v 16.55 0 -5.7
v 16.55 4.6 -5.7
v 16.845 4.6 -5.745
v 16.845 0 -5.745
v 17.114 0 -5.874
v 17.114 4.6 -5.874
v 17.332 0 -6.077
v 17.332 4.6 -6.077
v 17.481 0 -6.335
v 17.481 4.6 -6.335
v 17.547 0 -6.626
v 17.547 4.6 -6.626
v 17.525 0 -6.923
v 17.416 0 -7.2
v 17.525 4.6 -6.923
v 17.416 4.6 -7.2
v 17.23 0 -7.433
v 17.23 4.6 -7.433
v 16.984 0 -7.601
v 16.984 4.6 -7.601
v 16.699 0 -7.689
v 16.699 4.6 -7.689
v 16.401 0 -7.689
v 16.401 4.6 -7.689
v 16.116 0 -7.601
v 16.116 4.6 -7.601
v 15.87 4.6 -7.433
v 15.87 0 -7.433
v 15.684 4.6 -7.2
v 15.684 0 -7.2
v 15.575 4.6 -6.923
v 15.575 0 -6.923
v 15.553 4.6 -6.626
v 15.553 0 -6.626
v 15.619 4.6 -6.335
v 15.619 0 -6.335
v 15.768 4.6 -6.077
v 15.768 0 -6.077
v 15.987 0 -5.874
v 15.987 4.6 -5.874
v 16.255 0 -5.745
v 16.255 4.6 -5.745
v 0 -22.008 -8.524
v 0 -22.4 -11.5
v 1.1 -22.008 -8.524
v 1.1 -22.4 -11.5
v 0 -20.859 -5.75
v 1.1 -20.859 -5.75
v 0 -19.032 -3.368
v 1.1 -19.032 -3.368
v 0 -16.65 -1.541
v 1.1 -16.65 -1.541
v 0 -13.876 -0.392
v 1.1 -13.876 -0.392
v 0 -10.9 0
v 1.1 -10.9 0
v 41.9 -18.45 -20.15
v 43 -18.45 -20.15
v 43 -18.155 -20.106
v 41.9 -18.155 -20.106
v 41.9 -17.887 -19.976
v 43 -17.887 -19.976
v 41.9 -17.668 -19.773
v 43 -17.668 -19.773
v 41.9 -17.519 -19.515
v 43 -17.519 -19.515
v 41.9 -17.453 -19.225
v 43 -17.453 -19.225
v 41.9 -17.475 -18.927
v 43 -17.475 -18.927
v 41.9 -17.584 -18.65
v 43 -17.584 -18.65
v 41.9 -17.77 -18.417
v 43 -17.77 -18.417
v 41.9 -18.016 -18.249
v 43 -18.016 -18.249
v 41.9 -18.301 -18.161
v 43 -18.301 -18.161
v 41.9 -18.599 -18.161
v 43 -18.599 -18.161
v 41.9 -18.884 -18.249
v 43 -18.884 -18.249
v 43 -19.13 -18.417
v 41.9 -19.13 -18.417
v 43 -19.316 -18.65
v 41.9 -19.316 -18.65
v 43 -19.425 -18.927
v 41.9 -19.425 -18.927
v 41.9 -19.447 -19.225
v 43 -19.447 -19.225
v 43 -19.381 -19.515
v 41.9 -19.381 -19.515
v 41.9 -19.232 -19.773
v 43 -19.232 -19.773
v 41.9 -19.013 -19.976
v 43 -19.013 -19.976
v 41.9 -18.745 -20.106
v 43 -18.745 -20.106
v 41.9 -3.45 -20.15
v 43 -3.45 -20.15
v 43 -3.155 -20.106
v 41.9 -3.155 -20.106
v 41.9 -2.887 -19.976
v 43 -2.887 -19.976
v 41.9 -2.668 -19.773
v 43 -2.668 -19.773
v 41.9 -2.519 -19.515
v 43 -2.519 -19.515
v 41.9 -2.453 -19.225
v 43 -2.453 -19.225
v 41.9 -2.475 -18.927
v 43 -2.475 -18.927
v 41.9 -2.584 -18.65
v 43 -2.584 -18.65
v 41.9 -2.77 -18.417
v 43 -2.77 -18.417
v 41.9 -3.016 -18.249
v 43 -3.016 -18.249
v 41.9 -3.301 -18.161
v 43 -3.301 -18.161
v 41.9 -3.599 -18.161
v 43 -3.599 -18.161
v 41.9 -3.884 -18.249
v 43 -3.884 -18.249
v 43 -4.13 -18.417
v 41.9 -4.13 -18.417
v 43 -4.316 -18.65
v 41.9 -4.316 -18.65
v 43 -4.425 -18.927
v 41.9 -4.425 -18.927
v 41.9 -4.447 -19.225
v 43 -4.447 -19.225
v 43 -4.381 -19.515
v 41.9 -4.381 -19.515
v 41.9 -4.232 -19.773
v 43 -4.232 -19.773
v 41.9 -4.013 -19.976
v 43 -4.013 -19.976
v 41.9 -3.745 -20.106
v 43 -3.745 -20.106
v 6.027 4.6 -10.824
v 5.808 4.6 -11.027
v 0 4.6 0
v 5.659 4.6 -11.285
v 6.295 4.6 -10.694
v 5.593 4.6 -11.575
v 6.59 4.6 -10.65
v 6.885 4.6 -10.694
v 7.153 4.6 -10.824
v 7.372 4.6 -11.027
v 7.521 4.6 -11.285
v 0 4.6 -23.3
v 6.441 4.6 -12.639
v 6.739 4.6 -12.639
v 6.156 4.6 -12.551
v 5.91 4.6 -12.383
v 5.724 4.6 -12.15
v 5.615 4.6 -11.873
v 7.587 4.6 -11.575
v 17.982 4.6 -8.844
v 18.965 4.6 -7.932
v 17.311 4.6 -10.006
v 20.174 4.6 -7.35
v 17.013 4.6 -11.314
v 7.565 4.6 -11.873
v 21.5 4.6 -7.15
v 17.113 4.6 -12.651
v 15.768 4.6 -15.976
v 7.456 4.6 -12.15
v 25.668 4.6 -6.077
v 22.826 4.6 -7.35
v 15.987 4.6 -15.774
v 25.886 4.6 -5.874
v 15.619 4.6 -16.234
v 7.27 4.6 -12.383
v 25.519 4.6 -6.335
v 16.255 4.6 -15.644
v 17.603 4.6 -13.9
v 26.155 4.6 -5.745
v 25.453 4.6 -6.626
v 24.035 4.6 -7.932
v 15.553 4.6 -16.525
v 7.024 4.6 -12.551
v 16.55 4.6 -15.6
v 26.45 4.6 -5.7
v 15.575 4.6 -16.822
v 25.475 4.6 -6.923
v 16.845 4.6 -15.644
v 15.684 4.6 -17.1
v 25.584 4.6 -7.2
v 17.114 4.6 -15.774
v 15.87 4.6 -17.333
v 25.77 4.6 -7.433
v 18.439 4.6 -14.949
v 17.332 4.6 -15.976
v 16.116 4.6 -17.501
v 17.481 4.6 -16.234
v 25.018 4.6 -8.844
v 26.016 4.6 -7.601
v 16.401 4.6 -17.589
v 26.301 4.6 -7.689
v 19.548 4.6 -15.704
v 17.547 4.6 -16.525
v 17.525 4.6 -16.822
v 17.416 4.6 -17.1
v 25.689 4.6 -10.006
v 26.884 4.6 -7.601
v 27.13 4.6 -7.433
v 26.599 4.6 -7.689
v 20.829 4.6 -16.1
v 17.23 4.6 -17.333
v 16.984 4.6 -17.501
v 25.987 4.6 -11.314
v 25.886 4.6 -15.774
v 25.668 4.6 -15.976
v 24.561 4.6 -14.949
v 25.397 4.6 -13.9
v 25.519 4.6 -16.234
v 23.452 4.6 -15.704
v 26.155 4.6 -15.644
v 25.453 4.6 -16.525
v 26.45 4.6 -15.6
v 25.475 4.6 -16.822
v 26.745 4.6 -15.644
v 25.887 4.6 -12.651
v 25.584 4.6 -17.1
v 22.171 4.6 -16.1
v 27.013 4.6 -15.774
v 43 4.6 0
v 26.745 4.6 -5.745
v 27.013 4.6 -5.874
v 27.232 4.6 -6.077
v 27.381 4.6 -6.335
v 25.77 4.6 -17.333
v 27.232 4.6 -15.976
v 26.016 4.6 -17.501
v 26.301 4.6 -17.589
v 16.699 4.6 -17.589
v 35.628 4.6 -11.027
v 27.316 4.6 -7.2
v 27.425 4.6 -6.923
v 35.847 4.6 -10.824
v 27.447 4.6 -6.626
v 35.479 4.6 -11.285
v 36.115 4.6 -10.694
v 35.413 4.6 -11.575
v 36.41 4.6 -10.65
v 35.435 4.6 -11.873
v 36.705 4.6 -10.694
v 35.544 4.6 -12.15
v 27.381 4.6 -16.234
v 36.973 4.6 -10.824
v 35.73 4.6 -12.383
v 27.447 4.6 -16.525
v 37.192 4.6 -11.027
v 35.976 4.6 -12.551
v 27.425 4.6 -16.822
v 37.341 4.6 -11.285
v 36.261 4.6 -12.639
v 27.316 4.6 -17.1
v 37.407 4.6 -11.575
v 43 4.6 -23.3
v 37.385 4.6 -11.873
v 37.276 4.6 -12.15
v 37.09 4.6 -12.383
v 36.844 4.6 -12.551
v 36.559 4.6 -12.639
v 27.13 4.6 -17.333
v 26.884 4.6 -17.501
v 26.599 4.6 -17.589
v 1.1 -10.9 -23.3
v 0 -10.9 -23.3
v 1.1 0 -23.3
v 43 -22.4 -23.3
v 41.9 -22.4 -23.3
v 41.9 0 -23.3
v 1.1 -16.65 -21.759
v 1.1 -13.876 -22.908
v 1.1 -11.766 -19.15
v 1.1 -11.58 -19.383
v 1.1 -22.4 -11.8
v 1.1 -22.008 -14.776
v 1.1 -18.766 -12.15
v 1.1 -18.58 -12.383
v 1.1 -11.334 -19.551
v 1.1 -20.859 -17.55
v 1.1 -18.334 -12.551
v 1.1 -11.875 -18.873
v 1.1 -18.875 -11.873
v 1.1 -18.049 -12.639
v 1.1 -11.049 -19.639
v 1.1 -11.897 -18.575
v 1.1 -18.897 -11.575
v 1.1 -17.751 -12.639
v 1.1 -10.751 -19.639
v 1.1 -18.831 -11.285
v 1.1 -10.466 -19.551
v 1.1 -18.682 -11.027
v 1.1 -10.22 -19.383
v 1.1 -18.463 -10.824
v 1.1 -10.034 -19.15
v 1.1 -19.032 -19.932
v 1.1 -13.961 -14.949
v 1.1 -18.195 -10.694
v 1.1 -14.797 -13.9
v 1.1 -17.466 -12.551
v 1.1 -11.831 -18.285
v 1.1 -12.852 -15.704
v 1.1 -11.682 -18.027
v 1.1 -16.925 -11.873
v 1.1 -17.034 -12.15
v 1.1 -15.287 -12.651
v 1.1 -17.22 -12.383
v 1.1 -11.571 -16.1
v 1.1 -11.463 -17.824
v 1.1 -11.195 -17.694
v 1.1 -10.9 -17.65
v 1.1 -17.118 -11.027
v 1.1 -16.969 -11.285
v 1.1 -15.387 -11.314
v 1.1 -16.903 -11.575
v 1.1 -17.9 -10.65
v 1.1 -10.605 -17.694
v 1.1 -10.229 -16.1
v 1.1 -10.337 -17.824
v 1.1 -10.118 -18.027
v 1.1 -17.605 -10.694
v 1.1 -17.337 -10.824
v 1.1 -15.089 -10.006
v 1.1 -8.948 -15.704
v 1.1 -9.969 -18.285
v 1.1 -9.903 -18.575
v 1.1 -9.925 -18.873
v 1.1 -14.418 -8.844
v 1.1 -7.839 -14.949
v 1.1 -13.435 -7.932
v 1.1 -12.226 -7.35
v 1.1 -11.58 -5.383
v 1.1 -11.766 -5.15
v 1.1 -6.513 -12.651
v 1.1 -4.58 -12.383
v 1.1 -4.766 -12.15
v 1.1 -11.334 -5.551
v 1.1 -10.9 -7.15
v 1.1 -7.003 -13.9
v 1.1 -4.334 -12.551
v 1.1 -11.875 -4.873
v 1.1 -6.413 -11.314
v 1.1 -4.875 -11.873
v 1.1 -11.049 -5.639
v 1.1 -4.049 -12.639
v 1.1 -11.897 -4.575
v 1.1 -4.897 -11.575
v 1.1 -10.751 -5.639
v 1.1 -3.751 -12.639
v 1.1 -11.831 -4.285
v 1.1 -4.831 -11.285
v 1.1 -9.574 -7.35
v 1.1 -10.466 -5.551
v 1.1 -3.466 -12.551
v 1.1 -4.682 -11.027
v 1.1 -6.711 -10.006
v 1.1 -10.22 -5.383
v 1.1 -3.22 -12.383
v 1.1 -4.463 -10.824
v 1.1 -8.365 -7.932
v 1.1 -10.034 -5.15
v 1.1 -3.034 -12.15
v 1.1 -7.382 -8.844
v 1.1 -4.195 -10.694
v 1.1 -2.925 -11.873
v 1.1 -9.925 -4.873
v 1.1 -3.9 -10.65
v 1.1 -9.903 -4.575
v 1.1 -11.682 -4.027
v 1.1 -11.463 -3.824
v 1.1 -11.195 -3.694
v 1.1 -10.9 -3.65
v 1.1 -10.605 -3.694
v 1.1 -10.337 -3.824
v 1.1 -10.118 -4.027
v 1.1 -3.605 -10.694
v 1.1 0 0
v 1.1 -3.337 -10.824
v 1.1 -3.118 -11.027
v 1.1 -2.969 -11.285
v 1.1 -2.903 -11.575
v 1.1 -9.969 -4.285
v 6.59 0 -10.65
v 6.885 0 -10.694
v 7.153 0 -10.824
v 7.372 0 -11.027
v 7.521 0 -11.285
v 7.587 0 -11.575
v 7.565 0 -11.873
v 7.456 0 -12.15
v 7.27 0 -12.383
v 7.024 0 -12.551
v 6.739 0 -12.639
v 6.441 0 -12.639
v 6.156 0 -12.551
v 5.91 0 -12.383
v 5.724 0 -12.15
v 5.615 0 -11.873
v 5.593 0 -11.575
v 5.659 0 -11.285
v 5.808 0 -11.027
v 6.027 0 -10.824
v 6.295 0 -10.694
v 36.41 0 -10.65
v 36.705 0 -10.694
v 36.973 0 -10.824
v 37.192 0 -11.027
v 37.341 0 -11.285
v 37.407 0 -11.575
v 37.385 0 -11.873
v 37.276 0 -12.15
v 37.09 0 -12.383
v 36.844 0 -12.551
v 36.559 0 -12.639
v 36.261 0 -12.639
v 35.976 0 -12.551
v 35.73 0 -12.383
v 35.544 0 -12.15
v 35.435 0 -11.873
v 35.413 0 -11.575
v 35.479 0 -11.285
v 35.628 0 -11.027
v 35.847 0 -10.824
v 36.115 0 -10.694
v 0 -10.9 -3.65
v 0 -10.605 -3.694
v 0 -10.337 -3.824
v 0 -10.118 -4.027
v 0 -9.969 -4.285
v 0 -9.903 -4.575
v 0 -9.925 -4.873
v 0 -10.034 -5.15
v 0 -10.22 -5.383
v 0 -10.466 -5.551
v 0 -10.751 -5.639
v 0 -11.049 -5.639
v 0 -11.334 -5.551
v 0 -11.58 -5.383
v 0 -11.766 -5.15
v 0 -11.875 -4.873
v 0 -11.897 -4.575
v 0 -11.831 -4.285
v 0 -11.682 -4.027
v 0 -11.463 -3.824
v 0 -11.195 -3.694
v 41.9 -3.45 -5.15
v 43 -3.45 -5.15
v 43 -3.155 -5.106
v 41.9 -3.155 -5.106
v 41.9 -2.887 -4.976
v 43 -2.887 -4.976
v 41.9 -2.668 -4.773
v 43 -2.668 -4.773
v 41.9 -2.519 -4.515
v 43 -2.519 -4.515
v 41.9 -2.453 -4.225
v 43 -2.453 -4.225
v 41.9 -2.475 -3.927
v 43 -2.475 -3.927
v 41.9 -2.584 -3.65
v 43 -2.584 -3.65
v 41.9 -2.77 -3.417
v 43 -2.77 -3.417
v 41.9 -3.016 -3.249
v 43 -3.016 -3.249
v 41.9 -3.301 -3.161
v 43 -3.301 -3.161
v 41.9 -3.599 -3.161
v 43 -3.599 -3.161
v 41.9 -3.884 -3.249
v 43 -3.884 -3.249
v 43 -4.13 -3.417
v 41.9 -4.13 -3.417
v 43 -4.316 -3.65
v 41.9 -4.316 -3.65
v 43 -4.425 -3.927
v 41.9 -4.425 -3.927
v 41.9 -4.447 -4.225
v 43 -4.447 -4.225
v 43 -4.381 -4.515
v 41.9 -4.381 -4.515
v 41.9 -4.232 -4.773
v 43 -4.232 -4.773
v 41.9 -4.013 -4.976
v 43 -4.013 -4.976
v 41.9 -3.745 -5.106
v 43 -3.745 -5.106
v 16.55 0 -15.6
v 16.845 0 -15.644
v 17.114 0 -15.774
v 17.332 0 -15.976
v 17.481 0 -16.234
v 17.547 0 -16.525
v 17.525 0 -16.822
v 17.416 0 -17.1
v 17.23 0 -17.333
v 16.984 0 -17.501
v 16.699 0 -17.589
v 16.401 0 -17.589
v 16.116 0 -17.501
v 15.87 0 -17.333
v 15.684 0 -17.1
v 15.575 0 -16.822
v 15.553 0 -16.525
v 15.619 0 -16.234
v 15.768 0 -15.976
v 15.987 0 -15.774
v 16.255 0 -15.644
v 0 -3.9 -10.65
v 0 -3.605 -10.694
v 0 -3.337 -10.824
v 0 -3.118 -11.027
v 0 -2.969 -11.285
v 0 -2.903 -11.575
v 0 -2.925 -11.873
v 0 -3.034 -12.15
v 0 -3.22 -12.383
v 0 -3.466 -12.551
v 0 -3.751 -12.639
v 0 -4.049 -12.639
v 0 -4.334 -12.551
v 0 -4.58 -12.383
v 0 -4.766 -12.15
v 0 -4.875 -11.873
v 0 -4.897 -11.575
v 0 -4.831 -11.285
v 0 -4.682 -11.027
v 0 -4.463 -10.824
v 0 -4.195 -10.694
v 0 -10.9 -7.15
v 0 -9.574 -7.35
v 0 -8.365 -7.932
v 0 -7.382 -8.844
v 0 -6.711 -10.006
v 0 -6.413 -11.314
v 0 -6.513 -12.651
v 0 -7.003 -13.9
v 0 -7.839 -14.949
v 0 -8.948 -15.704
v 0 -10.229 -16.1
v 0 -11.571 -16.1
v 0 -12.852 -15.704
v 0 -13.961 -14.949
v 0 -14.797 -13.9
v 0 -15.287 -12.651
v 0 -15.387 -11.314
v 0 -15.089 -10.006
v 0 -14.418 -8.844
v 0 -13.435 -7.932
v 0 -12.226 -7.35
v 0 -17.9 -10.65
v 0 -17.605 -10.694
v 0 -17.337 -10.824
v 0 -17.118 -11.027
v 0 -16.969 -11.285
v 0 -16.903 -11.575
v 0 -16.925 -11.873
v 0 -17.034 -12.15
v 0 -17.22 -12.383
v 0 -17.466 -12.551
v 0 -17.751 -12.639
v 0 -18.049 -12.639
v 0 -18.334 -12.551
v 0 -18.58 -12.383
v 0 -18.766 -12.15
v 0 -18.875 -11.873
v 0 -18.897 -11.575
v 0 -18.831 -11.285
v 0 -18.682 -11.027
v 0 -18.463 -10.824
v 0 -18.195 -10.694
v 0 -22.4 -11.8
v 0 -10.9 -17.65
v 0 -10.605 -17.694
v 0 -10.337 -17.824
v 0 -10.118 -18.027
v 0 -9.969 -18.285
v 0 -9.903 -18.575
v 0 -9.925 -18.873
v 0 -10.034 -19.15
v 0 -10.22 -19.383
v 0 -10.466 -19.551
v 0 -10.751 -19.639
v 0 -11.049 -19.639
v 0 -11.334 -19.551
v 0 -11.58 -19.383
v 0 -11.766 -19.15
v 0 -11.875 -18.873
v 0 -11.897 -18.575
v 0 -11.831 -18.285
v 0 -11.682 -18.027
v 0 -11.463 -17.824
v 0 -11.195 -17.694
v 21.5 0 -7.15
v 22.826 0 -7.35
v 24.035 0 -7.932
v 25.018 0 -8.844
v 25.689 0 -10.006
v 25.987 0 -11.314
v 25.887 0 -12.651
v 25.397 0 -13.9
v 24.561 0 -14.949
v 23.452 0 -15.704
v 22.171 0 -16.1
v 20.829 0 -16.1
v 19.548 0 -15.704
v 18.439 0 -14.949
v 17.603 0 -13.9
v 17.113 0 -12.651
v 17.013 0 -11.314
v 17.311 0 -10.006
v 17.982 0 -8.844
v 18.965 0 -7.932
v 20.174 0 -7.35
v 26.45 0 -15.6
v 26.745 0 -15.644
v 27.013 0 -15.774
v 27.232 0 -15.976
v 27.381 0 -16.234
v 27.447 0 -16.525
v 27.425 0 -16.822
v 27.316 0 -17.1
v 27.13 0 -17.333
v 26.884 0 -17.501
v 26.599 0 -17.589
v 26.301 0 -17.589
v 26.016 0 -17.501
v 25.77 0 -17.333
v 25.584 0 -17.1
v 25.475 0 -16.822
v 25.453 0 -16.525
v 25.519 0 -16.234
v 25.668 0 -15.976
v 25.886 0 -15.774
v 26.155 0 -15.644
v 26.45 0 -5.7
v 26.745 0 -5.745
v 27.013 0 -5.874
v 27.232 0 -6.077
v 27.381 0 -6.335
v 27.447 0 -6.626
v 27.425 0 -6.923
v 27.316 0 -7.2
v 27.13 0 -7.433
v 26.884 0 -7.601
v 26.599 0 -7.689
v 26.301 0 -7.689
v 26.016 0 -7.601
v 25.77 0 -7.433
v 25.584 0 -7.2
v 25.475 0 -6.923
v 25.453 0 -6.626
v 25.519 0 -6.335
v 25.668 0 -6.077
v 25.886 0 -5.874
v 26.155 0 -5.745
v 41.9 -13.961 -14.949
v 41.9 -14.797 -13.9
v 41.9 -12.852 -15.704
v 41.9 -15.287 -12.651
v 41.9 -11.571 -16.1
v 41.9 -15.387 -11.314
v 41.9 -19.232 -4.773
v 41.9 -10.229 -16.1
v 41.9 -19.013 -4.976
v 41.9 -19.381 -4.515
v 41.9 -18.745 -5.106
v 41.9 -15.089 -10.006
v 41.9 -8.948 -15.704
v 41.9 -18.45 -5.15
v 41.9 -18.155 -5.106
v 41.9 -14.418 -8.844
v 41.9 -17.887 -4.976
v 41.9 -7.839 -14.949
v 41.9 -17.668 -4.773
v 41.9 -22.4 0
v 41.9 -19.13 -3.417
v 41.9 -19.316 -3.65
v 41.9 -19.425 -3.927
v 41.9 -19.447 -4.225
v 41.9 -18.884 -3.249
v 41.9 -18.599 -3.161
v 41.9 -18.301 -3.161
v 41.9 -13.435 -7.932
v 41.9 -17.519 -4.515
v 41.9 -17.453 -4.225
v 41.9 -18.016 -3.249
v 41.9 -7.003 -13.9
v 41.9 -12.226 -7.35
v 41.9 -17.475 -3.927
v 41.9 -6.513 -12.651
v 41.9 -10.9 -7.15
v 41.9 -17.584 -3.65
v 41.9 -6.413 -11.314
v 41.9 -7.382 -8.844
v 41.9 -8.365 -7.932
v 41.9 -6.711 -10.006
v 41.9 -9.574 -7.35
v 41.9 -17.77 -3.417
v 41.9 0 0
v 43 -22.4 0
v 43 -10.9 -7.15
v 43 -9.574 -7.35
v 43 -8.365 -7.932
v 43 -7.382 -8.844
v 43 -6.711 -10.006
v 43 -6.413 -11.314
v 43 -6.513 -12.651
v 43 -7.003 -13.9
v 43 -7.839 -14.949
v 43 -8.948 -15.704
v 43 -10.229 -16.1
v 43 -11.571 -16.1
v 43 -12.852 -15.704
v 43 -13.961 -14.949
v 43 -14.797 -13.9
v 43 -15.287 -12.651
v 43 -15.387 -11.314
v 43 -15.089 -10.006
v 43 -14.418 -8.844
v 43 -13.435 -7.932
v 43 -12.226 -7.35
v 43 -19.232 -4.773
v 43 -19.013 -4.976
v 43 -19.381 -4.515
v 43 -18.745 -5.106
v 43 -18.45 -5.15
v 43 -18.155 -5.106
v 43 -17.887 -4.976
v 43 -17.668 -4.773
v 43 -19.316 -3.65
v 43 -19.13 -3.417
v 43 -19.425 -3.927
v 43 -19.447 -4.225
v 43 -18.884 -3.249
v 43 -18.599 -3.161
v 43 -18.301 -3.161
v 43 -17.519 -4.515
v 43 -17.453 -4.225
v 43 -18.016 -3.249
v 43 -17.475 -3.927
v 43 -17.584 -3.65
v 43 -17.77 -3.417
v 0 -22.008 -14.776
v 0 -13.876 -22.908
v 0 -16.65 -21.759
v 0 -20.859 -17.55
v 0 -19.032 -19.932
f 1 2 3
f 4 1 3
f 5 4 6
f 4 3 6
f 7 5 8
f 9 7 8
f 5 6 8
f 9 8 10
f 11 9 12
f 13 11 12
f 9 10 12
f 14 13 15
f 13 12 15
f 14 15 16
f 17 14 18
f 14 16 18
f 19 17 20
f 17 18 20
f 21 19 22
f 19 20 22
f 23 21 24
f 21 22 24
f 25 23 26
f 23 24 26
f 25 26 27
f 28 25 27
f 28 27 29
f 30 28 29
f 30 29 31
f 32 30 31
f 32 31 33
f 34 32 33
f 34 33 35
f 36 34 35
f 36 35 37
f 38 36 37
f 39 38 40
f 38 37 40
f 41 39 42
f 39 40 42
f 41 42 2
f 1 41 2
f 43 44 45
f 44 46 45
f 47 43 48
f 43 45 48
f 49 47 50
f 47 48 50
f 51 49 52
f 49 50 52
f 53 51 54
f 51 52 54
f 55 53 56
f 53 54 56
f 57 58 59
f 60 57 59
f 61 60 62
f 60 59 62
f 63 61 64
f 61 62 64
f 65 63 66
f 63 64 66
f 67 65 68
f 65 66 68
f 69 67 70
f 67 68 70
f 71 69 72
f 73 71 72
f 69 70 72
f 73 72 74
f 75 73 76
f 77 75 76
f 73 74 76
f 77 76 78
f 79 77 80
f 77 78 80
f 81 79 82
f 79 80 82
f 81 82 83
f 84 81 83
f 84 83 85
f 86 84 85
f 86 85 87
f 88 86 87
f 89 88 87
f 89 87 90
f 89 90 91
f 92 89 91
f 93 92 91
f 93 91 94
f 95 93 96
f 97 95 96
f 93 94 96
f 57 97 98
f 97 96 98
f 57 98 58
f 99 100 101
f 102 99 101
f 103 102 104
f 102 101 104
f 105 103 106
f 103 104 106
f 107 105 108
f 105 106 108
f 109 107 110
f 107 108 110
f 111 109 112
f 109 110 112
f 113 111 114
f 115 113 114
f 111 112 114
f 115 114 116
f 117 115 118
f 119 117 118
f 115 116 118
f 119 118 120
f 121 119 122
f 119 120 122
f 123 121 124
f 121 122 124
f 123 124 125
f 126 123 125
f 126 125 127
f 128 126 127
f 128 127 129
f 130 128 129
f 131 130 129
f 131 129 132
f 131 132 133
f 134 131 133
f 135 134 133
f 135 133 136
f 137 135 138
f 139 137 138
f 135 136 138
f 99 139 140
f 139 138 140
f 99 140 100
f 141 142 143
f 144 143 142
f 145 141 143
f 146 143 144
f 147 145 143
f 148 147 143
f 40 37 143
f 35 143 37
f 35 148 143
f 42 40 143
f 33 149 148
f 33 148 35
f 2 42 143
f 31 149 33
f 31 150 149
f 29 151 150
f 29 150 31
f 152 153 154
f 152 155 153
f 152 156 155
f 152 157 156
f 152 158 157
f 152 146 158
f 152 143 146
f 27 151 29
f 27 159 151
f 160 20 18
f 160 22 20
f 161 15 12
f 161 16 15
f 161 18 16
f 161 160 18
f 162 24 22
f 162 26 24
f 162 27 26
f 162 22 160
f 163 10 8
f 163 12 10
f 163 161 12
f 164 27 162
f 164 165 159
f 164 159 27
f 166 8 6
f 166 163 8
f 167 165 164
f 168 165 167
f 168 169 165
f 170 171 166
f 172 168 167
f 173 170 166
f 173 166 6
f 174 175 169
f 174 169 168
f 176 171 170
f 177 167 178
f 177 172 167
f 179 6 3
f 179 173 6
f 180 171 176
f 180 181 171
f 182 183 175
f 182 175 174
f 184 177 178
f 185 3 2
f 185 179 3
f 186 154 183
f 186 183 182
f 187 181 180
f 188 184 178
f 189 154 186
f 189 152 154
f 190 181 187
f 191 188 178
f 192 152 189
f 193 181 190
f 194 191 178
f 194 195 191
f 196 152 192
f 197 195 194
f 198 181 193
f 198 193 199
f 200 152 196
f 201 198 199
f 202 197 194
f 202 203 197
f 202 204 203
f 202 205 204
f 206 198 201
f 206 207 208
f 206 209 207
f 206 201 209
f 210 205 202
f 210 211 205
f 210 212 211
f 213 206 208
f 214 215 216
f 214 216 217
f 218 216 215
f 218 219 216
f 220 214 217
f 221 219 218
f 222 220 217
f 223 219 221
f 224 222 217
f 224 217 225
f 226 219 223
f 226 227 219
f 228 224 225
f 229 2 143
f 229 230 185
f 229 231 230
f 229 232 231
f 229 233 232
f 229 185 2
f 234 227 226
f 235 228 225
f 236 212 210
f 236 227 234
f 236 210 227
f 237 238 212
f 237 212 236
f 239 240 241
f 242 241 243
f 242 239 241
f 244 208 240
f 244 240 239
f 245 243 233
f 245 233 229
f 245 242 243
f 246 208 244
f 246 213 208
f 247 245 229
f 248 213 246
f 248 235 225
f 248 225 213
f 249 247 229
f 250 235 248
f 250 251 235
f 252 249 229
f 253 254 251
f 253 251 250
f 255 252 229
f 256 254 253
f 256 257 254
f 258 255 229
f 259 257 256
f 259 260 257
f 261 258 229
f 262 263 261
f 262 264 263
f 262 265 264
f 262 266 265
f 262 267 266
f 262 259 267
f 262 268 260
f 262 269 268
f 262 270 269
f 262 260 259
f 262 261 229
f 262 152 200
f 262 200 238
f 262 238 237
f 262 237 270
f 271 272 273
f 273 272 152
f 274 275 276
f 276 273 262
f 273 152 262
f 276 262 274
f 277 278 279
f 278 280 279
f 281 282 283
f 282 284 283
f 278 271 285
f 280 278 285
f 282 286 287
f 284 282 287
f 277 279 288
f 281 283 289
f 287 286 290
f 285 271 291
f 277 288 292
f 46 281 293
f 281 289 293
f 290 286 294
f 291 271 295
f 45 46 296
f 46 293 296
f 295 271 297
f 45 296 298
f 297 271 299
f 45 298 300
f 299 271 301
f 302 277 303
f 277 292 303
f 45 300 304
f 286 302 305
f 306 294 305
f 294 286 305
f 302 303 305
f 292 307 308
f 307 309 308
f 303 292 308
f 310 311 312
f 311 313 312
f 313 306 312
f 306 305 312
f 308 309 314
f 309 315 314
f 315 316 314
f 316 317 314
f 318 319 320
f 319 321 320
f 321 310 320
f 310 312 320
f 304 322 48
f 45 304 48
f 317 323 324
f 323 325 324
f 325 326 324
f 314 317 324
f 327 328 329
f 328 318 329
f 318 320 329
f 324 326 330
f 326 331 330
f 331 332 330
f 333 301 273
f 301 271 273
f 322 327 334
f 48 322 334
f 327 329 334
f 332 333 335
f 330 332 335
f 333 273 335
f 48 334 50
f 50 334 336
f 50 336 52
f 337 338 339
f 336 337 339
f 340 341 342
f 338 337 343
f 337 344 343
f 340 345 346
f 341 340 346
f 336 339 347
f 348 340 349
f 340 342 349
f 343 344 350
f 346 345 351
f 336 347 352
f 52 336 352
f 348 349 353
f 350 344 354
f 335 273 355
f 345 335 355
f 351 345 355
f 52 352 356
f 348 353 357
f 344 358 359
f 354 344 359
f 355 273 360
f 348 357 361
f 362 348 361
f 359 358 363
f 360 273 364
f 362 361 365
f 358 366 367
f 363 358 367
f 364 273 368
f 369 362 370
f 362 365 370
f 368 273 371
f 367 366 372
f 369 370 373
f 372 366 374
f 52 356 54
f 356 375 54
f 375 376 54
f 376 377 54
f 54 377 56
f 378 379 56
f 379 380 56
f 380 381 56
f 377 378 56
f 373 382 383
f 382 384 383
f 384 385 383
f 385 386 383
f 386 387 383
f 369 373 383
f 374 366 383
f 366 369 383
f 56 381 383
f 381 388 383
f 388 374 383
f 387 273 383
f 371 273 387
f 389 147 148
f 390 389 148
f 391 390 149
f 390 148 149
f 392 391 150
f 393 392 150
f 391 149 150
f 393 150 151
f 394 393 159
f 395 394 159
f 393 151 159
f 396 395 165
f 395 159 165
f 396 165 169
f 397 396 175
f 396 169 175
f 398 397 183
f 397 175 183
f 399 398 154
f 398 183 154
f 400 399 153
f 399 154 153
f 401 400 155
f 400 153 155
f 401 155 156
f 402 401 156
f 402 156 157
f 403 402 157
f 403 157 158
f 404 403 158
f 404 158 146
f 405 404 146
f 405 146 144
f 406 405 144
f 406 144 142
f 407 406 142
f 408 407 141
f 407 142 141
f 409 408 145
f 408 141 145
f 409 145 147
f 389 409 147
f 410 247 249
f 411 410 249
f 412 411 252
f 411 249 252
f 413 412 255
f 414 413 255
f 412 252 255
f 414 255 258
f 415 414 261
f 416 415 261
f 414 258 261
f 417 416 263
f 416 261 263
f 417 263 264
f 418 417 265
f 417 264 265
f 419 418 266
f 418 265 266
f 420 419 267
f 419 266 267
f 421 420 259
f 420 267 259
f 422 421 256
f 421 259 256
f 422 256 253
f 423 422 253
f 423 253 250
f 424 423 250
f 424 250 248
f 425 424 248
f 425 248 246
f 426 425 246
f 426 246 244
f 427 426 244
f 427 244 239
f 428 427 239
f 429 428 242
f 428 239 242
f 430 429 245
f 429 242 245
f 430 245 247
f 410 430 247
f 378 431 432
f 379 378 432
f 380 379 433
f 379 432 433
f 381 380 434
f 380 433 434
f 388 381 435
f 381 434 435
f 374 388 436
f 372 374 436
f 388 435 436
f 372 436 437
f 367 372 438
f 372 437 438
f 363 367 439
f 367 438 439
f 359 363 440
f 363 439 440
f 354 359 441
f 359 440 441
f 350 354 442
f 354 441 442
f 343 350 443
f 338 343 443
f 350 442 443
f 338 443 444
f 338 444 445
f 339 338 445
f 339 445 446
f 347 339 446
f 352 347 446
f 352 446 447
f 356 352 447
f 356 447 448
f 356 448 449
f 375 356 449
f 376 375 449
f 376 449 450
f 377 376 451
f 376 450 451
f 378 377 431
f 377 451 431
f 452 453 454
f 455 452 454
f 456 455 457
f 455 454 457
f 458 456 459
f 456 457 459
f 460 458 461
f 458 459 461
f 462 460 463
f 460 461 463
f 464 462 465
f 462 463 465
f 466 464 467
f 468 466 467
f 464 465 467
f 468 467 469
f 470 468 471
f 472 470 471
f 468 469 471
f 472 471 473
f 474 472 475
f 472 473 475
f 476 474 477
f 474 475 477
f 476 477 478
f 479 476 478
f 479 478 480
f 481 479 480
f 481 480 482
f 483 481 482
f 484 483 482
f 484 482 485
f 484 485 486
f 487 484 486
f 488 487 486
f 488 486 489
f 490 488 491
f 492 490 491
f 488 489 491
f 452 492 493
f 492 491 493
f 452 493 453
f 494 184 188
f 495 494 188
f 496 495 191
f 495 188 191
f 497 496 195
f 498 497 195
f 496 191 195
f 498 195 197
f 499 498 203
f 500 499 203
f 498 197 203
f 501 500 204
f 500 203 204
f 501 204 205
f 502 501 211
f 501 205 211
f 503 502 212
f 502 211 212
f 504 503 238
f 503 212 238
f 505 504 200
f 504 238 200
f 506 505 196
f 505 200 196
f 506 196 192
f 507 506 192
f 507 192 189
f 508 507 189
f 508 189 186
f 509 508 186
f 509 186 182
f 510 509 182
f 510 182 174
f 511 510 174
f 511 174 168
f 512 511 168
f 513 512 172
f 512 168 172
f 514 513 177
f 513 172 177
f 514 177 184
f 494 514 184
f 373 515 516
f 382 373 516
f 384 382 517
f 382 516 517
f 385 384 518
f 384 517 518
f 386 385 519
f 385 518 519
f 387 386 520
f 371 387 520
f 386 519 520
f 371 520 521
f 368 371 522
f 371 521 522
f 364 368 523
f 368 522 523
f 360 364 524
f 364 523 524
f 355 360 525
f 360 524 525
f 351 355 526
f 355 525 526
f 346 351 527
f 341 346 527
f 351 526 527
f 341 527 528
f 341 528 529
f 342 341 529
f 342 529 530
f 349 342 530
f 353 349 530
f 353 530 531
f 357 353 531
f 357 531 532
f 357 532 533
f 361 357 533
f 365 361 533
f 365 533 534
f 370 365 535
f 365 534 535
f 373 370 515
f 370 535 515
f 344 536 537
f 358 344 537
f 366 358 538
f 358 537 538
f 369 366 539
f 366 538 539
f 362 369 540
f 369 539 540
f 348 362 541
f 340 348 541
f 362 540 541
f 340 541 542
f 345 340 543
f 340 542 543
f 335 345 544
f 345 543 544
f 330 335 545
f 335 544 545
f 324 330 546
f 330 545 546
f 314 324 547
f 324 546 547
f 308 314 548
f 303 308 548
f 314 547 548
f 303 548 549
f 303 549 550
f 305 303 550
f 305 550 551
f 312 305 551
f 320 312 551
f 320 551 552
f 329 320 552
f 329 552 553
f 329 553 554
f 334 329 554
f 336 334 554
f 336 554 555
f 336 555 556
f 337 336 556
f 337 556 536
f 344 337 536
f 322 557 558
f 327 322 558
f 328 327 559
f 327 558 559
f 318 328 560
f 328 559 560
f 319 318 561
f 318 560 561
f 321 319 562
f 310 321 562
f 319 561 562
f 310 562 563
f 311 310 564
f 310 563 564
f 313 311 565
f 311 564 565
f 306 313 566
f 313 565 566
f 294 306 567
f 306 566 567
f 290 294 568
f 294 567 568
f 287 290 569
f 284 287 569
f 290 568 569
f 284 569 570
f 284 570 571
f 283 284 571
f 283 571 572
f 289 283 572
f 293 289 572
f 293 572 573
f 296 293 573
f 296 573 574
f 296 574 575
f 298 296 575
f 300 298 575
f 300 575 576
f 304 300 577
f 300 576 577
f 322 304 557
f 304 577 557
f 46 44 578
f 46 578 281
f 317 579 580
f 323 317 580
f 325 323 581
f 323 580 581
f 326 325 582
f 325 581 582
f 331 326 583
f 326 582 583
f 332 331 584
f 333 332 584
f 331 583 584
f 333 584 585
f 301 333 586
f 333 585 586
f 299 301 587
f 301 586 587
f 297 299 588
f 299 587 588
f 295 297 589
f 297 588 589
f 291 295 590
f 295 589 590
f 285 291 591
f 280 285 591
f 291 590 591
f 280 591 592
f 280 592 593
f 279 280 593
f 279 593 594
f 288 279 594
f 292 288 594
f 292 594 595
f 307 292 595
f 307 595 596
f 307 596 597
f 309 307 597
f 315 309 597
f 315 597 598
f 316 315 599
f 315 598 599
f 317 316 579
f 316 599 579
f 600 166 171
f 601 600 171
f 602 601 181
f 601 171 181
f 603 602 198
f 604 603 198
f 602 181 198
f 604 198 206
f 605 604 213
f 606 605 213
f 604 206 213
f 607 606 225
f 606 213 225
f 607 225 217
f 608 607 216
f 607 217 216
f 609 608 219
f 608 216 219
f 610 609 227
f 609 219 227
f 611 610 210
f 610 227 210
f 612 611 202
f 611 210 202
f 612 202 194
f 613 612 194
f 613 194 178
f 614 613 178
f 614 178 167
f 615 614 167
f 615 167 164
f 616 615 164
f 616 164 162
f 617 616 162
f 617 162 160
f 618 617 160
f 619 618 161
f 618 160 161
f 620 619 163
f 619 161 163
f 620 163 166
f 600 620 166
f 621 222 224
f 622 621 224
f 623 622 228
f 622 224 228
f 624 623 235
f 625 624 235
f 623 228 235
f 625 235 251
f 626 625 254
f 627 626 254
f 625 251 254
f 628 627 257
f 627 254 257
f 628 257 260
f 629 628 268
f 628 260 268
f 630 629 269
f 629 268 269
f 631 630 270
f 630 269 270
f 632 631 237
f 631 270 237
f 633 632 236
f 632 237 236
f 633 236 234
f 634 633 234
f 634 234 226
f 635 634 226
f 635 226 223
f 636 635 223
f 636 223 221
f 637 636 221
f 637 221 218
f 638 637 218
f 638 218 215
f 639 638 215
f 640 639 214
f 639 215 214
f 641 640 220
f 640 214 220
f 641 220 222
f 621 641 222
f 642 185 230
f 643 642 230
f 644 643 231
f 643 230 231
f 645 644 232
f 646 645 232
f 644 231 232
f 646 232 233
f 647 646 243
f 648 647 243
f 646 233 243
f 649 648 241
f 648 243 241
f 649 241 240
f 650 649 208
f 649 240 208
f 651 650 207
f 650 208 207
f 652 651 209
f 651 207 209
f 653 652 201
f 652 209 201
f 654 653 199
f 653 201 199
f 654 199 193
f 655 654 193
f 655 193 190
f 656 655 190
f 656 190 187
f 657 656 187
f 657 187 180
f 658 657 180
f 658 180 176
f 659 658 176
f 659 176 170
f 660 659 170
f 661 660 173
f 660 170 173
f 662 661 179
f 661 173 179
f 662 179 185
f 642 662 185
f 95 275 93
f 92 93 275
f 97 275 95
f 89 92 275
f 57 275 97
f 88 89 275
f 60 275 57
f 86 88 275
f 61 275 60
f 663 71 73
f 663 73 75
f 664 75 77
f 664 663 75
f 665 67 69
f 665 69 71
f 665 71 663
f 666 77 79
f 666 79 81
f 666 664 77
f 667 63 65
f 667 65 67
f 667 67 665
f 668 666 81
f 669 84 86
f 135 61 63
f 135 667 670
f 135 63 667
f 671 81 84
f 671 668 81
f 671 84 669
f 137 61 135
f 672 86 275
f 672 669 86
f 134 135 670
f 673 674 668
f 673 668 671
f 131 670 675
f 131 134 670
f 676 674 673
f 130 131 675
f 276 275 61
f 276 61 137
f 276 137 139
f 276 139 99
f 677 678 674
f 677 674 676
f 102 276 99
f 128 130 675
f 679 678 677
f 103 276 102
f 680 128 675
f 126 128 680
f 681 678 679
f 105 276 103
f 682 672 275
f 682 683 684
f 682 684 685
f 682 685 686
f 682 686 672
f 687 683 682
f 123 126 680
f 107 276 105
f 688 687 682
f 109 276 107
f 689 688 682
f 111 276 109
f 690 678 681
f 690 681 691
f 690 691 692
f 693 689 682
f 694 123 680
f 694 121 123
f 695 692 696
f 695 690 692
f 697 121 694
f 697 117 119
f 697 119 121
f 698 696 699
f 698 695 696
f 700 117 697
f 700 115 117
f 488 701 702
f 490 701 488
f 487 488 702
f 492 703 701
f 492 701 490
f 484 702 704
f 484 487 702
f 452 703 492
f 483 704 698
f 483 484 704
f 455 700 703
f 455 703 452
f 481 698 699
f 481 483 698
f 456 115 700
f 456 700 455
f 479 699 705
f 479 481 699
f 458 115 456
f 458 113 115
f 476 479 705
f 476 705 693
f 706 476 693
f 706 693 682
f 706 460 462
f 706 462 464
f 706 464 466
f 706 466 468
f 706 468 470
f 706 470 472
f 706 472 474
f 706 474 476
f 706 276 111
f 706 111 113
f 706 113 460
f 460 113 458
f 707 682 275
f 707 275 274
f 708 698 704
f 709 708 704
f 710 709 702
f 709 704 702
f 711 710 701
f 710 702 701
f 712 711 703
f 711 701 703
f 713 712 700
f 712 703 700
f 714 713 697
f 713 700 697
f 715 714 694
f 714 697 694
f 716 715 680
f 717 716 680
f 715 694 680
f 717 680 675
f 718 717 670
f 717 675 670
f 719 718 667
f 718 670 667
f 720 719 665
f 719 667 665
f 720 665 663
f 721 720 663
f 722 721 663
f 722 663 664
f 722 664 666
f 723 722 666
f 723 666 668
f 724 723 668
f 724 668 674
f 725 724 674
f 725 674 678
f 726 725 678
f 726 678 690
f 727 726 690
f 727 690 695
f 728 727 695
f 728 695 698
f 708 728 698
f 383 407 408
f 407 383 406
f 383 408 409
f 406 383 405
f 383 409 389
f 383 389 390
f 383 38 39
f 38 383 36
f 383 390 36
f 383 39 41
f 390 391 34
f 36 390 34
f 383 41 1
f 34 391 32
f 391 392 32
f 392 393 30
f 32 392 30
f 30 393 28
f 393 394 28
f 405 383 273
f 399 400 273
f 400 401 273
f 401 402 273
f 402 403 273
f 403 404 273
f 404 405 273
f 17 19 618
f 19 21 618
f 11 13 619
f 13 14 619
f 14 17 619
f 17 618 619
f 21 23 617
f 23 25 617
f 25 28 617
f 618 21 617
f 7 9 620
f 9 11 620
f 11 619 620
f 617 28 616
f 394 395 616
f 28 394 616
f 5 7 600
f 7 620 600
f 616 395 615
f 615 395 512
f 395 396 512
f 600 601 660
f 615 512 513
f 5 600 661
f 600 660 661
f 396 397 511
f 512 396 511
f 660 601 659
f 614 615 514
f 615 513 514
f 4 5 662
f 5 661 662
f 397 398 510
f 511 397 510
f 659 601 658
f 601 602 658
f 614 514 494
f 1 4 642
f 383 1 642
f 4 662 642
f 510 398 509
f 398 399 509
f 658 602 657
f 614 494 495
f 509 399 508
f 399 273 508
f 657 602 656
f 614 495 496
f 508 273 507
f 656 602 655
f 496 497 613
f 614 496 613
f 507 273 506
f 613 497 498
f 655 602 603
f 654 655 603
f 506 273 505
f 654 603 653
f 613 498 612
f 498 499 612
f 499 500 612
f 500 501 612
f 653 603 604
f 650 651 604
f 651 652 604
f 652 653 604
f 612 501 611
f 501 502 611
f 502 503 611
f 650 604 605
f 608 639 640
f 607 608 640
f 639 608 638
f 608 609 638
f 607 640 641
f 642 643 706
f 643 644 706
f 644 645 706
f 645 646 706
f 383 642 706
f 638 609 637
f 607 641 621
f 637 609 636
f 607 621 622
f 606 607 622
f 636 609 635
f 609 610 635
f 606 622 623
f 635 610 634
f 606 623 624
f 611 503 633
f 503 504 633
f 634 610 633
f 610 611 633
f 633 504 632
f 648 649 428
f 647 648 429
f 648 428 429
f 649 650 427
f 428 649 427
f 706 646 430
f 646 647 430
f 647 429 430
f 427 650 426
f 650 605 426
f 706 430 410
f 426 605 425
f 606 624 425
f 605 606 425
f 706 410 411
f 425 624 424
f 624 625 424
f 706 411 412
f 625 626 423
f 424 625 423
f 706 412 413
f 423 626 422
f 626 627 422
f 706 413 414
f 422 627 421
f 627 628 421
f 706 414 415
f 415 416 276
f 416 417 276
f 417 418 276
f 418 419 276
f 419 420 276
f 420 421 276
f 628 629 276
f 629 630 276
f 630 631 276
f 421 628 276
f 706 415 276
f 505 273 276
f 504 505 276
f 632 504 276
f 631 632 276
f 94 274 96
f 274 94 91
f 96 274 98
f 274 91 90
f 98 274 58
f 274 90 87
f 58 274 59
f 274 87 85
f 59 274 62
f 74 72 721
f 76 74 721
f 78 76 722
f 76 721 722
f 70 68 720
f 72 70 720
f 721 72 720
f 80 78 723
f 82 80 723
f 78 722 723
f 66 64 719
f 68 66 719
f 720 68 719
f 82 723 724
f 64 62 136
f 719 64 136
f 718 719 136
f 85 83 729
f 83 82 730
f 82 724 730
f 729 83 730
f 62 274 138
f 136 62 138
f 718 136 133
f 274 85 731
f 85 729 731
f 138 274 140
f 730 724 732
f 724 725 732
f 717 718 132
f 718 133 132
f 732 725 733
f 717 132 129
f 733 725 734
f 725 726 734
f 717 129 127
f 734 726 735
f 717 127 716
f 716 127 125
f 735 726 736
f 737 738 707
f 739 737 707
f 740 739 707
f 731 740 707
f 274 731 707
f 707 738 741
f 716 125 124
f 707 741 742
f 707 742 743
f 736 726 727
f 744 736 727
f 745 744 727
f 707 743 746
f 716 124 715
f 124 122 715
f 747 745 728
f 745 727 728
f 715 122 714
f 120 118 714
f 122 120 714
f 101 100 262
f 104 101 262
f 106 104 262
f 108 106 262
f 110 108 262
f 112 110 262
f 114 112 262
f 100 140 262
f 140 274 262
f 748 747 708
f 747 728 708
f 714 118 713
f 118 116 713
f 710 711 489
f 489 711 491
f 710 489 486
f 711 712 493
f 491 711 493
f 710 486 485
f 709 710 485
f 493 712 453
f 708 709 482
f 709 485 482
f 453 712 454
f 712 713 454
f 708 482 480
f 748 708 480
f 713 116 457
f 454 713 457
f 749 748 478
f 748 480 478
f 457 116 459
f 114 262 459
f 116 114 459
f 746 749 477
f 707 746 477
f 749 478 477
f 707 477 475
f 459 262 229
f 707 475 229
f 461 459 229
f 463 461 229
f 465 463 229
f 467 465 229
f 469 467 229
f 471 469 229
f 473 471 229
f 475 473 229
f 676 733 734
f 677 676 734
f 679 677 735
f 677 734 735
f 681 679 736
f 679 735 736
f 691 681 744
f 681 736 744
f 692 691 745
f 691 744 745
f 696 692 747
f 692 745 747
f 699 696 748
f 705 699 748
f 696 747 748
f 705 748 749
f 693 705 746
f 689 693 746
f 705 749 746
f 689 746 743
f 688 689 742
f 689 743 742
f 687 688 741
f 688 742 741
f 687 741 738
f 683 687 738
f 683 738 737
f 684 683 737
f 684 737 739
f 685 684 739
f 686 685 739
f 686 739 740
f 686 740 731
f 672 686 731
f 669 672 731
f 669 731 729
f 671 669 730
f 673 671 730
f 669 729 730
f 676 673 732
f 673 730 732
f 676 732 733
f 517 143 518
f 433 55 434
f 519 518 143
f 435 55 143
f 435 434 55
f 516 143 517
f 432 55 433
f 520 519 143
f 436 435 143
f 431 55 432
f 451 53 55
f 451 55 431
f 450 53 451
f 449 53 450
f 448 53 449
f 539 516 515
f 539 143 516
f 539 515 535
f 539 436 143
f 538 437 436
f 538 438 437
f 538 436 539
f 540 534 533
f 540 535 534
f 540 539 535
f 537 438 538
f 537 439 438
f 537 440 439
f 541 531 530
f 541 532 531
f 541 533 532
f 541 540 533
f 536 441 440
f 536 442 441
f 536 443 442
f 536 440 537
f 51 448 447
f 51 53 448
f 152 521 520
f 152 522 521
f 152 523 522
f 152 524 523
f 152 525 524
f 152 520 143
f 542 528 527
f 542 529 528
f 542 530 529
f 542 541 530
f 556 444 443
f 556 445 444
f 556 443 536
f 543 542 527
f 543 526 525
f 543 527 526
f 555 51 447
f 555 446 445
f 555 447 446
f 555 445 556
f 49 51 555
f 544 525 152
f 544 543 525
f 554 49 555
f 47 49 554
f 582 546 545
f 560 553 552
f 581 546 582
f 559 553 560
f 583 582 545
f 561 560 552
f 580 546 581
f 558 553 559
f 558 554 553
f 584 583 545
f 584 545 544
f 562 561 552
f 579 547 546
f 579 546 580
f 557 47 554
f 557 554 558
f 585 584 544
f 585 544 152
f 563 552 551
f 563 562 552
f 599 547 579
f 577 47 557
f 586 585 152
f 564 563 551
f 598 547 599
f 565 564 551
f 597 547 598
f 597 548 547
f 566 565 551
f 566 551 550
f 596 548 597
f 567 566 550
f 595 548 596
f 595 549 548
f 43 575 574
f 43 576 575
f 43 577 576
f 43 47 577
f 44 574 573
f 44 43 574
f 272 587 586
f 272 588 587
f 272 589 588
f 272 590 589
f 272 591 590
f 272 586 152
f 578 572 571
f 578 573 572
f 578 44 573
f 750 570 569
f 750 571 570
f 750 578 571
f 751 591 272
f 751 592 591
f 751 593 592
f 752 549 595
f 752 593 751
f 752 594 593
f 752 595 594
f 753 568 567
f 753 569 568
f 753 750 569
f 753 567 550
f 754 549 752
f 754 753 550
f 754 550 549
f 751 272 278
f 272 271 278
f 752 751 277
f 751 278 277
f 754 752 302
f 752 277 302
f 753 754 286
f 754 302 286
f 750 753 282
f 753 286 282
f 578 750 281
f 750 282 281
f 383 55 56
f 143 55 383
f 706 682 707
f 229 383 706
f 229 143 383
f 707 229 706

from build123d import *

# Parameters (mm, degrees)
SKETCH1_W                   = 43
SKETCH1_H                   = 23.3
MOUNTPLATE_DEPTH            = 4.6
SKETCH3_R                   = 4.5
AXLEHOLE_MOUNT_DEPTH        = 4.6
SKETCH2_R                   = 1
MOUNTHOLES_DEPTH            = 4.6
SKETCH4_W                   = 1.1
SKETCH4_H                   = 23.3
SERVOLEGS_DEPTH             = 22.4
CENTERHOLES_REACH           = 55.793
SKETCH5_R                   = 4.5
SKETCH6_R                   = 1
ROTORSIDE_MOUNTHOLES_DEPTH  = 1.1
FILLET1_R                   = 11.5
FILLET2_R                   = 11.5
SKETCH7_R                   = 1
SLIDERSIDE_MOUNTHOLES_DEPTH = 1.1


with BuildPart() as part:
    # Sketch1 → MountPlate (new body)
    with BuildSketch(Plane(origin=(0, 0, 0), x_dir=(1, 0, 0), z_dir=(0, 1, 0))):
        with Locations((21.5, 11.65)):
            Rectangle(SKETCH1_W, SKETCH1_H)
    extrude(amount=MOUNTPLATE_DEPTH)

    # Sketch3 → AxleHole-Mount (cut)
    with BuildSketch(Plane(origin=(0, 4.6, 0), x_dir=(1, 0, 0), z_dir=(0, 1, 0))):
        with Locations(Location((21.5, 11.65, 0), (0, 0, 270))):
            Circle(SKETCH3_R)
    extrude(amount=-AXLEHOLE_MOUNT_DEPTH, mode=Mode.SUBTRACT)

    # Sketch2 → MountHoles (cut)
    with BuildSketch(Plane(origin=(0, 4.6, 0), x_dir=(1, 0, 0), z_dir=(0, 1, 0))):
        with Locations(Location((6.59, 11.65, 0), (0, 0, 270))):
            Circle(SKETCH2_R)
        with Locations(Location((16.550252532, 6.700252532, 0), (0, 0, 270))):
            Circle(SKETCH2_R)
        with Locations(Location((36.41, 11.65, 0), (0, 0, 270))):
            Circle(SKETCH2_R)
        with Locations(Location((16.550252532, 16.599747468, 0), (0, 0, 270))):
            Circle(SKETCH2_R)
        with Locations(Location((26.449747468, 16.599747468, 0), (0, 0, 270))):
            Circle(SKETCH2_R)
        with Locations(Location((26.449747468, 6.700252532, 0), (0, 0, 270))):
            Circle(SKETCH2_R)
    extrude(amount=-MOUNTHOLES_DEPTH, mode=Mode.SUBTRACT)

    # Sketch4 → ServoLegs (add)
    with BuildSketch(Plane.XZ):
        with Locations((42.45, -11.65)):
            Rectangle(SKETCH4_W, SKETCH4_H)
        with Locations((0.55, -11.65)):
            Rectangle(SKETCH4_W, SKETCH4_H)
    extrude(amount=SERVOLEGS_DEPTH)

    # CenterHoles: up to this face of the body (flat: up to its plane)
    centerholes_end = Plane(part.part.faces().sort_by_distance((43, -8.9, -11.65))[0])
    # Sketch5 → CenterHoles (cut, up to the picked face)
    with BuildSketch(Plane.ZY, mode=Mode.PRIVATE) as centerholes_sk1:
        with Locations((-11.65, -10.9)):
            Circle(SKETCH5_R)
    centerholes_tool1 = split(extrude(centerholes_sk1.sketch, amount=-CENTERHOLES_REACH, mode=Mode.PRIVATE), bisect_by=centerholes_end, keep=Keep.BOTH, mode=Mode.PRIVATE)
    add(centerholes_tool1.solids().sort_by(Axis((0, -10.9, -11.65), (1, 0, 0)))[0], mode=Mode.SUBTRACT)

    # Sketch6 → RotorSide-MountHoles (cut)
    with BuildSketch(Plane.ZY):
        with Locations((-11.65, -17.9)):
            Circle(SKETCH6_R)
        with Locations((-18.65, -10.9)):
            Circle(SKETCH6_R)
        with Locations((-11.65, -3.9)):
            Circle(SKETCH6_R)
        with Locations((-4.65, -10.9)):
            Circle(SKETCH6_R)
    extrude(amount=-ROTORSIDE_MOUNTHOLES_DEPTH, mode=Mode.SUBTRACT)

    # Fillet1
    fillet1_edges = [part.edges().sort_by_distance(p)[0] for p in [
        (0.55, -22.4, -23.3),
    ]]
    fillet(fillet1_edges, radius=FILLET1_R)

    # Fillet2
    fillet2_edges = [part.edges().sort_by_distance(p)[0] for p in [
        (0.55, -22.4, 0),
    ]]
    fillet(fillet2_edges, radius=FILLET2_R)

    # Sketch7 → SliderSide-MountHoles (cut)
    with BuildSketch(Plane(origin=(43, 0, 0), x_dir=(0, 0, -1), z_dir=(1, 0, 0))):
        with Locations((19.15, -18.45)):
            Circle(SKETCH7_R)
        with Locations((19.15, -3.45)):
            Circle(SKETCH7_R)
        with Locations((4.15, -3.45)):
            Circle(SKETCH7_R)
        with Locations((4.15, -18.45)):
            Circle(SKETCH7_R)
    extrude(amount=-SLIDERSIDE_MOUNTHOLES_DEPTH, mode=Mode.SUBTRACT)


solid = part.part
